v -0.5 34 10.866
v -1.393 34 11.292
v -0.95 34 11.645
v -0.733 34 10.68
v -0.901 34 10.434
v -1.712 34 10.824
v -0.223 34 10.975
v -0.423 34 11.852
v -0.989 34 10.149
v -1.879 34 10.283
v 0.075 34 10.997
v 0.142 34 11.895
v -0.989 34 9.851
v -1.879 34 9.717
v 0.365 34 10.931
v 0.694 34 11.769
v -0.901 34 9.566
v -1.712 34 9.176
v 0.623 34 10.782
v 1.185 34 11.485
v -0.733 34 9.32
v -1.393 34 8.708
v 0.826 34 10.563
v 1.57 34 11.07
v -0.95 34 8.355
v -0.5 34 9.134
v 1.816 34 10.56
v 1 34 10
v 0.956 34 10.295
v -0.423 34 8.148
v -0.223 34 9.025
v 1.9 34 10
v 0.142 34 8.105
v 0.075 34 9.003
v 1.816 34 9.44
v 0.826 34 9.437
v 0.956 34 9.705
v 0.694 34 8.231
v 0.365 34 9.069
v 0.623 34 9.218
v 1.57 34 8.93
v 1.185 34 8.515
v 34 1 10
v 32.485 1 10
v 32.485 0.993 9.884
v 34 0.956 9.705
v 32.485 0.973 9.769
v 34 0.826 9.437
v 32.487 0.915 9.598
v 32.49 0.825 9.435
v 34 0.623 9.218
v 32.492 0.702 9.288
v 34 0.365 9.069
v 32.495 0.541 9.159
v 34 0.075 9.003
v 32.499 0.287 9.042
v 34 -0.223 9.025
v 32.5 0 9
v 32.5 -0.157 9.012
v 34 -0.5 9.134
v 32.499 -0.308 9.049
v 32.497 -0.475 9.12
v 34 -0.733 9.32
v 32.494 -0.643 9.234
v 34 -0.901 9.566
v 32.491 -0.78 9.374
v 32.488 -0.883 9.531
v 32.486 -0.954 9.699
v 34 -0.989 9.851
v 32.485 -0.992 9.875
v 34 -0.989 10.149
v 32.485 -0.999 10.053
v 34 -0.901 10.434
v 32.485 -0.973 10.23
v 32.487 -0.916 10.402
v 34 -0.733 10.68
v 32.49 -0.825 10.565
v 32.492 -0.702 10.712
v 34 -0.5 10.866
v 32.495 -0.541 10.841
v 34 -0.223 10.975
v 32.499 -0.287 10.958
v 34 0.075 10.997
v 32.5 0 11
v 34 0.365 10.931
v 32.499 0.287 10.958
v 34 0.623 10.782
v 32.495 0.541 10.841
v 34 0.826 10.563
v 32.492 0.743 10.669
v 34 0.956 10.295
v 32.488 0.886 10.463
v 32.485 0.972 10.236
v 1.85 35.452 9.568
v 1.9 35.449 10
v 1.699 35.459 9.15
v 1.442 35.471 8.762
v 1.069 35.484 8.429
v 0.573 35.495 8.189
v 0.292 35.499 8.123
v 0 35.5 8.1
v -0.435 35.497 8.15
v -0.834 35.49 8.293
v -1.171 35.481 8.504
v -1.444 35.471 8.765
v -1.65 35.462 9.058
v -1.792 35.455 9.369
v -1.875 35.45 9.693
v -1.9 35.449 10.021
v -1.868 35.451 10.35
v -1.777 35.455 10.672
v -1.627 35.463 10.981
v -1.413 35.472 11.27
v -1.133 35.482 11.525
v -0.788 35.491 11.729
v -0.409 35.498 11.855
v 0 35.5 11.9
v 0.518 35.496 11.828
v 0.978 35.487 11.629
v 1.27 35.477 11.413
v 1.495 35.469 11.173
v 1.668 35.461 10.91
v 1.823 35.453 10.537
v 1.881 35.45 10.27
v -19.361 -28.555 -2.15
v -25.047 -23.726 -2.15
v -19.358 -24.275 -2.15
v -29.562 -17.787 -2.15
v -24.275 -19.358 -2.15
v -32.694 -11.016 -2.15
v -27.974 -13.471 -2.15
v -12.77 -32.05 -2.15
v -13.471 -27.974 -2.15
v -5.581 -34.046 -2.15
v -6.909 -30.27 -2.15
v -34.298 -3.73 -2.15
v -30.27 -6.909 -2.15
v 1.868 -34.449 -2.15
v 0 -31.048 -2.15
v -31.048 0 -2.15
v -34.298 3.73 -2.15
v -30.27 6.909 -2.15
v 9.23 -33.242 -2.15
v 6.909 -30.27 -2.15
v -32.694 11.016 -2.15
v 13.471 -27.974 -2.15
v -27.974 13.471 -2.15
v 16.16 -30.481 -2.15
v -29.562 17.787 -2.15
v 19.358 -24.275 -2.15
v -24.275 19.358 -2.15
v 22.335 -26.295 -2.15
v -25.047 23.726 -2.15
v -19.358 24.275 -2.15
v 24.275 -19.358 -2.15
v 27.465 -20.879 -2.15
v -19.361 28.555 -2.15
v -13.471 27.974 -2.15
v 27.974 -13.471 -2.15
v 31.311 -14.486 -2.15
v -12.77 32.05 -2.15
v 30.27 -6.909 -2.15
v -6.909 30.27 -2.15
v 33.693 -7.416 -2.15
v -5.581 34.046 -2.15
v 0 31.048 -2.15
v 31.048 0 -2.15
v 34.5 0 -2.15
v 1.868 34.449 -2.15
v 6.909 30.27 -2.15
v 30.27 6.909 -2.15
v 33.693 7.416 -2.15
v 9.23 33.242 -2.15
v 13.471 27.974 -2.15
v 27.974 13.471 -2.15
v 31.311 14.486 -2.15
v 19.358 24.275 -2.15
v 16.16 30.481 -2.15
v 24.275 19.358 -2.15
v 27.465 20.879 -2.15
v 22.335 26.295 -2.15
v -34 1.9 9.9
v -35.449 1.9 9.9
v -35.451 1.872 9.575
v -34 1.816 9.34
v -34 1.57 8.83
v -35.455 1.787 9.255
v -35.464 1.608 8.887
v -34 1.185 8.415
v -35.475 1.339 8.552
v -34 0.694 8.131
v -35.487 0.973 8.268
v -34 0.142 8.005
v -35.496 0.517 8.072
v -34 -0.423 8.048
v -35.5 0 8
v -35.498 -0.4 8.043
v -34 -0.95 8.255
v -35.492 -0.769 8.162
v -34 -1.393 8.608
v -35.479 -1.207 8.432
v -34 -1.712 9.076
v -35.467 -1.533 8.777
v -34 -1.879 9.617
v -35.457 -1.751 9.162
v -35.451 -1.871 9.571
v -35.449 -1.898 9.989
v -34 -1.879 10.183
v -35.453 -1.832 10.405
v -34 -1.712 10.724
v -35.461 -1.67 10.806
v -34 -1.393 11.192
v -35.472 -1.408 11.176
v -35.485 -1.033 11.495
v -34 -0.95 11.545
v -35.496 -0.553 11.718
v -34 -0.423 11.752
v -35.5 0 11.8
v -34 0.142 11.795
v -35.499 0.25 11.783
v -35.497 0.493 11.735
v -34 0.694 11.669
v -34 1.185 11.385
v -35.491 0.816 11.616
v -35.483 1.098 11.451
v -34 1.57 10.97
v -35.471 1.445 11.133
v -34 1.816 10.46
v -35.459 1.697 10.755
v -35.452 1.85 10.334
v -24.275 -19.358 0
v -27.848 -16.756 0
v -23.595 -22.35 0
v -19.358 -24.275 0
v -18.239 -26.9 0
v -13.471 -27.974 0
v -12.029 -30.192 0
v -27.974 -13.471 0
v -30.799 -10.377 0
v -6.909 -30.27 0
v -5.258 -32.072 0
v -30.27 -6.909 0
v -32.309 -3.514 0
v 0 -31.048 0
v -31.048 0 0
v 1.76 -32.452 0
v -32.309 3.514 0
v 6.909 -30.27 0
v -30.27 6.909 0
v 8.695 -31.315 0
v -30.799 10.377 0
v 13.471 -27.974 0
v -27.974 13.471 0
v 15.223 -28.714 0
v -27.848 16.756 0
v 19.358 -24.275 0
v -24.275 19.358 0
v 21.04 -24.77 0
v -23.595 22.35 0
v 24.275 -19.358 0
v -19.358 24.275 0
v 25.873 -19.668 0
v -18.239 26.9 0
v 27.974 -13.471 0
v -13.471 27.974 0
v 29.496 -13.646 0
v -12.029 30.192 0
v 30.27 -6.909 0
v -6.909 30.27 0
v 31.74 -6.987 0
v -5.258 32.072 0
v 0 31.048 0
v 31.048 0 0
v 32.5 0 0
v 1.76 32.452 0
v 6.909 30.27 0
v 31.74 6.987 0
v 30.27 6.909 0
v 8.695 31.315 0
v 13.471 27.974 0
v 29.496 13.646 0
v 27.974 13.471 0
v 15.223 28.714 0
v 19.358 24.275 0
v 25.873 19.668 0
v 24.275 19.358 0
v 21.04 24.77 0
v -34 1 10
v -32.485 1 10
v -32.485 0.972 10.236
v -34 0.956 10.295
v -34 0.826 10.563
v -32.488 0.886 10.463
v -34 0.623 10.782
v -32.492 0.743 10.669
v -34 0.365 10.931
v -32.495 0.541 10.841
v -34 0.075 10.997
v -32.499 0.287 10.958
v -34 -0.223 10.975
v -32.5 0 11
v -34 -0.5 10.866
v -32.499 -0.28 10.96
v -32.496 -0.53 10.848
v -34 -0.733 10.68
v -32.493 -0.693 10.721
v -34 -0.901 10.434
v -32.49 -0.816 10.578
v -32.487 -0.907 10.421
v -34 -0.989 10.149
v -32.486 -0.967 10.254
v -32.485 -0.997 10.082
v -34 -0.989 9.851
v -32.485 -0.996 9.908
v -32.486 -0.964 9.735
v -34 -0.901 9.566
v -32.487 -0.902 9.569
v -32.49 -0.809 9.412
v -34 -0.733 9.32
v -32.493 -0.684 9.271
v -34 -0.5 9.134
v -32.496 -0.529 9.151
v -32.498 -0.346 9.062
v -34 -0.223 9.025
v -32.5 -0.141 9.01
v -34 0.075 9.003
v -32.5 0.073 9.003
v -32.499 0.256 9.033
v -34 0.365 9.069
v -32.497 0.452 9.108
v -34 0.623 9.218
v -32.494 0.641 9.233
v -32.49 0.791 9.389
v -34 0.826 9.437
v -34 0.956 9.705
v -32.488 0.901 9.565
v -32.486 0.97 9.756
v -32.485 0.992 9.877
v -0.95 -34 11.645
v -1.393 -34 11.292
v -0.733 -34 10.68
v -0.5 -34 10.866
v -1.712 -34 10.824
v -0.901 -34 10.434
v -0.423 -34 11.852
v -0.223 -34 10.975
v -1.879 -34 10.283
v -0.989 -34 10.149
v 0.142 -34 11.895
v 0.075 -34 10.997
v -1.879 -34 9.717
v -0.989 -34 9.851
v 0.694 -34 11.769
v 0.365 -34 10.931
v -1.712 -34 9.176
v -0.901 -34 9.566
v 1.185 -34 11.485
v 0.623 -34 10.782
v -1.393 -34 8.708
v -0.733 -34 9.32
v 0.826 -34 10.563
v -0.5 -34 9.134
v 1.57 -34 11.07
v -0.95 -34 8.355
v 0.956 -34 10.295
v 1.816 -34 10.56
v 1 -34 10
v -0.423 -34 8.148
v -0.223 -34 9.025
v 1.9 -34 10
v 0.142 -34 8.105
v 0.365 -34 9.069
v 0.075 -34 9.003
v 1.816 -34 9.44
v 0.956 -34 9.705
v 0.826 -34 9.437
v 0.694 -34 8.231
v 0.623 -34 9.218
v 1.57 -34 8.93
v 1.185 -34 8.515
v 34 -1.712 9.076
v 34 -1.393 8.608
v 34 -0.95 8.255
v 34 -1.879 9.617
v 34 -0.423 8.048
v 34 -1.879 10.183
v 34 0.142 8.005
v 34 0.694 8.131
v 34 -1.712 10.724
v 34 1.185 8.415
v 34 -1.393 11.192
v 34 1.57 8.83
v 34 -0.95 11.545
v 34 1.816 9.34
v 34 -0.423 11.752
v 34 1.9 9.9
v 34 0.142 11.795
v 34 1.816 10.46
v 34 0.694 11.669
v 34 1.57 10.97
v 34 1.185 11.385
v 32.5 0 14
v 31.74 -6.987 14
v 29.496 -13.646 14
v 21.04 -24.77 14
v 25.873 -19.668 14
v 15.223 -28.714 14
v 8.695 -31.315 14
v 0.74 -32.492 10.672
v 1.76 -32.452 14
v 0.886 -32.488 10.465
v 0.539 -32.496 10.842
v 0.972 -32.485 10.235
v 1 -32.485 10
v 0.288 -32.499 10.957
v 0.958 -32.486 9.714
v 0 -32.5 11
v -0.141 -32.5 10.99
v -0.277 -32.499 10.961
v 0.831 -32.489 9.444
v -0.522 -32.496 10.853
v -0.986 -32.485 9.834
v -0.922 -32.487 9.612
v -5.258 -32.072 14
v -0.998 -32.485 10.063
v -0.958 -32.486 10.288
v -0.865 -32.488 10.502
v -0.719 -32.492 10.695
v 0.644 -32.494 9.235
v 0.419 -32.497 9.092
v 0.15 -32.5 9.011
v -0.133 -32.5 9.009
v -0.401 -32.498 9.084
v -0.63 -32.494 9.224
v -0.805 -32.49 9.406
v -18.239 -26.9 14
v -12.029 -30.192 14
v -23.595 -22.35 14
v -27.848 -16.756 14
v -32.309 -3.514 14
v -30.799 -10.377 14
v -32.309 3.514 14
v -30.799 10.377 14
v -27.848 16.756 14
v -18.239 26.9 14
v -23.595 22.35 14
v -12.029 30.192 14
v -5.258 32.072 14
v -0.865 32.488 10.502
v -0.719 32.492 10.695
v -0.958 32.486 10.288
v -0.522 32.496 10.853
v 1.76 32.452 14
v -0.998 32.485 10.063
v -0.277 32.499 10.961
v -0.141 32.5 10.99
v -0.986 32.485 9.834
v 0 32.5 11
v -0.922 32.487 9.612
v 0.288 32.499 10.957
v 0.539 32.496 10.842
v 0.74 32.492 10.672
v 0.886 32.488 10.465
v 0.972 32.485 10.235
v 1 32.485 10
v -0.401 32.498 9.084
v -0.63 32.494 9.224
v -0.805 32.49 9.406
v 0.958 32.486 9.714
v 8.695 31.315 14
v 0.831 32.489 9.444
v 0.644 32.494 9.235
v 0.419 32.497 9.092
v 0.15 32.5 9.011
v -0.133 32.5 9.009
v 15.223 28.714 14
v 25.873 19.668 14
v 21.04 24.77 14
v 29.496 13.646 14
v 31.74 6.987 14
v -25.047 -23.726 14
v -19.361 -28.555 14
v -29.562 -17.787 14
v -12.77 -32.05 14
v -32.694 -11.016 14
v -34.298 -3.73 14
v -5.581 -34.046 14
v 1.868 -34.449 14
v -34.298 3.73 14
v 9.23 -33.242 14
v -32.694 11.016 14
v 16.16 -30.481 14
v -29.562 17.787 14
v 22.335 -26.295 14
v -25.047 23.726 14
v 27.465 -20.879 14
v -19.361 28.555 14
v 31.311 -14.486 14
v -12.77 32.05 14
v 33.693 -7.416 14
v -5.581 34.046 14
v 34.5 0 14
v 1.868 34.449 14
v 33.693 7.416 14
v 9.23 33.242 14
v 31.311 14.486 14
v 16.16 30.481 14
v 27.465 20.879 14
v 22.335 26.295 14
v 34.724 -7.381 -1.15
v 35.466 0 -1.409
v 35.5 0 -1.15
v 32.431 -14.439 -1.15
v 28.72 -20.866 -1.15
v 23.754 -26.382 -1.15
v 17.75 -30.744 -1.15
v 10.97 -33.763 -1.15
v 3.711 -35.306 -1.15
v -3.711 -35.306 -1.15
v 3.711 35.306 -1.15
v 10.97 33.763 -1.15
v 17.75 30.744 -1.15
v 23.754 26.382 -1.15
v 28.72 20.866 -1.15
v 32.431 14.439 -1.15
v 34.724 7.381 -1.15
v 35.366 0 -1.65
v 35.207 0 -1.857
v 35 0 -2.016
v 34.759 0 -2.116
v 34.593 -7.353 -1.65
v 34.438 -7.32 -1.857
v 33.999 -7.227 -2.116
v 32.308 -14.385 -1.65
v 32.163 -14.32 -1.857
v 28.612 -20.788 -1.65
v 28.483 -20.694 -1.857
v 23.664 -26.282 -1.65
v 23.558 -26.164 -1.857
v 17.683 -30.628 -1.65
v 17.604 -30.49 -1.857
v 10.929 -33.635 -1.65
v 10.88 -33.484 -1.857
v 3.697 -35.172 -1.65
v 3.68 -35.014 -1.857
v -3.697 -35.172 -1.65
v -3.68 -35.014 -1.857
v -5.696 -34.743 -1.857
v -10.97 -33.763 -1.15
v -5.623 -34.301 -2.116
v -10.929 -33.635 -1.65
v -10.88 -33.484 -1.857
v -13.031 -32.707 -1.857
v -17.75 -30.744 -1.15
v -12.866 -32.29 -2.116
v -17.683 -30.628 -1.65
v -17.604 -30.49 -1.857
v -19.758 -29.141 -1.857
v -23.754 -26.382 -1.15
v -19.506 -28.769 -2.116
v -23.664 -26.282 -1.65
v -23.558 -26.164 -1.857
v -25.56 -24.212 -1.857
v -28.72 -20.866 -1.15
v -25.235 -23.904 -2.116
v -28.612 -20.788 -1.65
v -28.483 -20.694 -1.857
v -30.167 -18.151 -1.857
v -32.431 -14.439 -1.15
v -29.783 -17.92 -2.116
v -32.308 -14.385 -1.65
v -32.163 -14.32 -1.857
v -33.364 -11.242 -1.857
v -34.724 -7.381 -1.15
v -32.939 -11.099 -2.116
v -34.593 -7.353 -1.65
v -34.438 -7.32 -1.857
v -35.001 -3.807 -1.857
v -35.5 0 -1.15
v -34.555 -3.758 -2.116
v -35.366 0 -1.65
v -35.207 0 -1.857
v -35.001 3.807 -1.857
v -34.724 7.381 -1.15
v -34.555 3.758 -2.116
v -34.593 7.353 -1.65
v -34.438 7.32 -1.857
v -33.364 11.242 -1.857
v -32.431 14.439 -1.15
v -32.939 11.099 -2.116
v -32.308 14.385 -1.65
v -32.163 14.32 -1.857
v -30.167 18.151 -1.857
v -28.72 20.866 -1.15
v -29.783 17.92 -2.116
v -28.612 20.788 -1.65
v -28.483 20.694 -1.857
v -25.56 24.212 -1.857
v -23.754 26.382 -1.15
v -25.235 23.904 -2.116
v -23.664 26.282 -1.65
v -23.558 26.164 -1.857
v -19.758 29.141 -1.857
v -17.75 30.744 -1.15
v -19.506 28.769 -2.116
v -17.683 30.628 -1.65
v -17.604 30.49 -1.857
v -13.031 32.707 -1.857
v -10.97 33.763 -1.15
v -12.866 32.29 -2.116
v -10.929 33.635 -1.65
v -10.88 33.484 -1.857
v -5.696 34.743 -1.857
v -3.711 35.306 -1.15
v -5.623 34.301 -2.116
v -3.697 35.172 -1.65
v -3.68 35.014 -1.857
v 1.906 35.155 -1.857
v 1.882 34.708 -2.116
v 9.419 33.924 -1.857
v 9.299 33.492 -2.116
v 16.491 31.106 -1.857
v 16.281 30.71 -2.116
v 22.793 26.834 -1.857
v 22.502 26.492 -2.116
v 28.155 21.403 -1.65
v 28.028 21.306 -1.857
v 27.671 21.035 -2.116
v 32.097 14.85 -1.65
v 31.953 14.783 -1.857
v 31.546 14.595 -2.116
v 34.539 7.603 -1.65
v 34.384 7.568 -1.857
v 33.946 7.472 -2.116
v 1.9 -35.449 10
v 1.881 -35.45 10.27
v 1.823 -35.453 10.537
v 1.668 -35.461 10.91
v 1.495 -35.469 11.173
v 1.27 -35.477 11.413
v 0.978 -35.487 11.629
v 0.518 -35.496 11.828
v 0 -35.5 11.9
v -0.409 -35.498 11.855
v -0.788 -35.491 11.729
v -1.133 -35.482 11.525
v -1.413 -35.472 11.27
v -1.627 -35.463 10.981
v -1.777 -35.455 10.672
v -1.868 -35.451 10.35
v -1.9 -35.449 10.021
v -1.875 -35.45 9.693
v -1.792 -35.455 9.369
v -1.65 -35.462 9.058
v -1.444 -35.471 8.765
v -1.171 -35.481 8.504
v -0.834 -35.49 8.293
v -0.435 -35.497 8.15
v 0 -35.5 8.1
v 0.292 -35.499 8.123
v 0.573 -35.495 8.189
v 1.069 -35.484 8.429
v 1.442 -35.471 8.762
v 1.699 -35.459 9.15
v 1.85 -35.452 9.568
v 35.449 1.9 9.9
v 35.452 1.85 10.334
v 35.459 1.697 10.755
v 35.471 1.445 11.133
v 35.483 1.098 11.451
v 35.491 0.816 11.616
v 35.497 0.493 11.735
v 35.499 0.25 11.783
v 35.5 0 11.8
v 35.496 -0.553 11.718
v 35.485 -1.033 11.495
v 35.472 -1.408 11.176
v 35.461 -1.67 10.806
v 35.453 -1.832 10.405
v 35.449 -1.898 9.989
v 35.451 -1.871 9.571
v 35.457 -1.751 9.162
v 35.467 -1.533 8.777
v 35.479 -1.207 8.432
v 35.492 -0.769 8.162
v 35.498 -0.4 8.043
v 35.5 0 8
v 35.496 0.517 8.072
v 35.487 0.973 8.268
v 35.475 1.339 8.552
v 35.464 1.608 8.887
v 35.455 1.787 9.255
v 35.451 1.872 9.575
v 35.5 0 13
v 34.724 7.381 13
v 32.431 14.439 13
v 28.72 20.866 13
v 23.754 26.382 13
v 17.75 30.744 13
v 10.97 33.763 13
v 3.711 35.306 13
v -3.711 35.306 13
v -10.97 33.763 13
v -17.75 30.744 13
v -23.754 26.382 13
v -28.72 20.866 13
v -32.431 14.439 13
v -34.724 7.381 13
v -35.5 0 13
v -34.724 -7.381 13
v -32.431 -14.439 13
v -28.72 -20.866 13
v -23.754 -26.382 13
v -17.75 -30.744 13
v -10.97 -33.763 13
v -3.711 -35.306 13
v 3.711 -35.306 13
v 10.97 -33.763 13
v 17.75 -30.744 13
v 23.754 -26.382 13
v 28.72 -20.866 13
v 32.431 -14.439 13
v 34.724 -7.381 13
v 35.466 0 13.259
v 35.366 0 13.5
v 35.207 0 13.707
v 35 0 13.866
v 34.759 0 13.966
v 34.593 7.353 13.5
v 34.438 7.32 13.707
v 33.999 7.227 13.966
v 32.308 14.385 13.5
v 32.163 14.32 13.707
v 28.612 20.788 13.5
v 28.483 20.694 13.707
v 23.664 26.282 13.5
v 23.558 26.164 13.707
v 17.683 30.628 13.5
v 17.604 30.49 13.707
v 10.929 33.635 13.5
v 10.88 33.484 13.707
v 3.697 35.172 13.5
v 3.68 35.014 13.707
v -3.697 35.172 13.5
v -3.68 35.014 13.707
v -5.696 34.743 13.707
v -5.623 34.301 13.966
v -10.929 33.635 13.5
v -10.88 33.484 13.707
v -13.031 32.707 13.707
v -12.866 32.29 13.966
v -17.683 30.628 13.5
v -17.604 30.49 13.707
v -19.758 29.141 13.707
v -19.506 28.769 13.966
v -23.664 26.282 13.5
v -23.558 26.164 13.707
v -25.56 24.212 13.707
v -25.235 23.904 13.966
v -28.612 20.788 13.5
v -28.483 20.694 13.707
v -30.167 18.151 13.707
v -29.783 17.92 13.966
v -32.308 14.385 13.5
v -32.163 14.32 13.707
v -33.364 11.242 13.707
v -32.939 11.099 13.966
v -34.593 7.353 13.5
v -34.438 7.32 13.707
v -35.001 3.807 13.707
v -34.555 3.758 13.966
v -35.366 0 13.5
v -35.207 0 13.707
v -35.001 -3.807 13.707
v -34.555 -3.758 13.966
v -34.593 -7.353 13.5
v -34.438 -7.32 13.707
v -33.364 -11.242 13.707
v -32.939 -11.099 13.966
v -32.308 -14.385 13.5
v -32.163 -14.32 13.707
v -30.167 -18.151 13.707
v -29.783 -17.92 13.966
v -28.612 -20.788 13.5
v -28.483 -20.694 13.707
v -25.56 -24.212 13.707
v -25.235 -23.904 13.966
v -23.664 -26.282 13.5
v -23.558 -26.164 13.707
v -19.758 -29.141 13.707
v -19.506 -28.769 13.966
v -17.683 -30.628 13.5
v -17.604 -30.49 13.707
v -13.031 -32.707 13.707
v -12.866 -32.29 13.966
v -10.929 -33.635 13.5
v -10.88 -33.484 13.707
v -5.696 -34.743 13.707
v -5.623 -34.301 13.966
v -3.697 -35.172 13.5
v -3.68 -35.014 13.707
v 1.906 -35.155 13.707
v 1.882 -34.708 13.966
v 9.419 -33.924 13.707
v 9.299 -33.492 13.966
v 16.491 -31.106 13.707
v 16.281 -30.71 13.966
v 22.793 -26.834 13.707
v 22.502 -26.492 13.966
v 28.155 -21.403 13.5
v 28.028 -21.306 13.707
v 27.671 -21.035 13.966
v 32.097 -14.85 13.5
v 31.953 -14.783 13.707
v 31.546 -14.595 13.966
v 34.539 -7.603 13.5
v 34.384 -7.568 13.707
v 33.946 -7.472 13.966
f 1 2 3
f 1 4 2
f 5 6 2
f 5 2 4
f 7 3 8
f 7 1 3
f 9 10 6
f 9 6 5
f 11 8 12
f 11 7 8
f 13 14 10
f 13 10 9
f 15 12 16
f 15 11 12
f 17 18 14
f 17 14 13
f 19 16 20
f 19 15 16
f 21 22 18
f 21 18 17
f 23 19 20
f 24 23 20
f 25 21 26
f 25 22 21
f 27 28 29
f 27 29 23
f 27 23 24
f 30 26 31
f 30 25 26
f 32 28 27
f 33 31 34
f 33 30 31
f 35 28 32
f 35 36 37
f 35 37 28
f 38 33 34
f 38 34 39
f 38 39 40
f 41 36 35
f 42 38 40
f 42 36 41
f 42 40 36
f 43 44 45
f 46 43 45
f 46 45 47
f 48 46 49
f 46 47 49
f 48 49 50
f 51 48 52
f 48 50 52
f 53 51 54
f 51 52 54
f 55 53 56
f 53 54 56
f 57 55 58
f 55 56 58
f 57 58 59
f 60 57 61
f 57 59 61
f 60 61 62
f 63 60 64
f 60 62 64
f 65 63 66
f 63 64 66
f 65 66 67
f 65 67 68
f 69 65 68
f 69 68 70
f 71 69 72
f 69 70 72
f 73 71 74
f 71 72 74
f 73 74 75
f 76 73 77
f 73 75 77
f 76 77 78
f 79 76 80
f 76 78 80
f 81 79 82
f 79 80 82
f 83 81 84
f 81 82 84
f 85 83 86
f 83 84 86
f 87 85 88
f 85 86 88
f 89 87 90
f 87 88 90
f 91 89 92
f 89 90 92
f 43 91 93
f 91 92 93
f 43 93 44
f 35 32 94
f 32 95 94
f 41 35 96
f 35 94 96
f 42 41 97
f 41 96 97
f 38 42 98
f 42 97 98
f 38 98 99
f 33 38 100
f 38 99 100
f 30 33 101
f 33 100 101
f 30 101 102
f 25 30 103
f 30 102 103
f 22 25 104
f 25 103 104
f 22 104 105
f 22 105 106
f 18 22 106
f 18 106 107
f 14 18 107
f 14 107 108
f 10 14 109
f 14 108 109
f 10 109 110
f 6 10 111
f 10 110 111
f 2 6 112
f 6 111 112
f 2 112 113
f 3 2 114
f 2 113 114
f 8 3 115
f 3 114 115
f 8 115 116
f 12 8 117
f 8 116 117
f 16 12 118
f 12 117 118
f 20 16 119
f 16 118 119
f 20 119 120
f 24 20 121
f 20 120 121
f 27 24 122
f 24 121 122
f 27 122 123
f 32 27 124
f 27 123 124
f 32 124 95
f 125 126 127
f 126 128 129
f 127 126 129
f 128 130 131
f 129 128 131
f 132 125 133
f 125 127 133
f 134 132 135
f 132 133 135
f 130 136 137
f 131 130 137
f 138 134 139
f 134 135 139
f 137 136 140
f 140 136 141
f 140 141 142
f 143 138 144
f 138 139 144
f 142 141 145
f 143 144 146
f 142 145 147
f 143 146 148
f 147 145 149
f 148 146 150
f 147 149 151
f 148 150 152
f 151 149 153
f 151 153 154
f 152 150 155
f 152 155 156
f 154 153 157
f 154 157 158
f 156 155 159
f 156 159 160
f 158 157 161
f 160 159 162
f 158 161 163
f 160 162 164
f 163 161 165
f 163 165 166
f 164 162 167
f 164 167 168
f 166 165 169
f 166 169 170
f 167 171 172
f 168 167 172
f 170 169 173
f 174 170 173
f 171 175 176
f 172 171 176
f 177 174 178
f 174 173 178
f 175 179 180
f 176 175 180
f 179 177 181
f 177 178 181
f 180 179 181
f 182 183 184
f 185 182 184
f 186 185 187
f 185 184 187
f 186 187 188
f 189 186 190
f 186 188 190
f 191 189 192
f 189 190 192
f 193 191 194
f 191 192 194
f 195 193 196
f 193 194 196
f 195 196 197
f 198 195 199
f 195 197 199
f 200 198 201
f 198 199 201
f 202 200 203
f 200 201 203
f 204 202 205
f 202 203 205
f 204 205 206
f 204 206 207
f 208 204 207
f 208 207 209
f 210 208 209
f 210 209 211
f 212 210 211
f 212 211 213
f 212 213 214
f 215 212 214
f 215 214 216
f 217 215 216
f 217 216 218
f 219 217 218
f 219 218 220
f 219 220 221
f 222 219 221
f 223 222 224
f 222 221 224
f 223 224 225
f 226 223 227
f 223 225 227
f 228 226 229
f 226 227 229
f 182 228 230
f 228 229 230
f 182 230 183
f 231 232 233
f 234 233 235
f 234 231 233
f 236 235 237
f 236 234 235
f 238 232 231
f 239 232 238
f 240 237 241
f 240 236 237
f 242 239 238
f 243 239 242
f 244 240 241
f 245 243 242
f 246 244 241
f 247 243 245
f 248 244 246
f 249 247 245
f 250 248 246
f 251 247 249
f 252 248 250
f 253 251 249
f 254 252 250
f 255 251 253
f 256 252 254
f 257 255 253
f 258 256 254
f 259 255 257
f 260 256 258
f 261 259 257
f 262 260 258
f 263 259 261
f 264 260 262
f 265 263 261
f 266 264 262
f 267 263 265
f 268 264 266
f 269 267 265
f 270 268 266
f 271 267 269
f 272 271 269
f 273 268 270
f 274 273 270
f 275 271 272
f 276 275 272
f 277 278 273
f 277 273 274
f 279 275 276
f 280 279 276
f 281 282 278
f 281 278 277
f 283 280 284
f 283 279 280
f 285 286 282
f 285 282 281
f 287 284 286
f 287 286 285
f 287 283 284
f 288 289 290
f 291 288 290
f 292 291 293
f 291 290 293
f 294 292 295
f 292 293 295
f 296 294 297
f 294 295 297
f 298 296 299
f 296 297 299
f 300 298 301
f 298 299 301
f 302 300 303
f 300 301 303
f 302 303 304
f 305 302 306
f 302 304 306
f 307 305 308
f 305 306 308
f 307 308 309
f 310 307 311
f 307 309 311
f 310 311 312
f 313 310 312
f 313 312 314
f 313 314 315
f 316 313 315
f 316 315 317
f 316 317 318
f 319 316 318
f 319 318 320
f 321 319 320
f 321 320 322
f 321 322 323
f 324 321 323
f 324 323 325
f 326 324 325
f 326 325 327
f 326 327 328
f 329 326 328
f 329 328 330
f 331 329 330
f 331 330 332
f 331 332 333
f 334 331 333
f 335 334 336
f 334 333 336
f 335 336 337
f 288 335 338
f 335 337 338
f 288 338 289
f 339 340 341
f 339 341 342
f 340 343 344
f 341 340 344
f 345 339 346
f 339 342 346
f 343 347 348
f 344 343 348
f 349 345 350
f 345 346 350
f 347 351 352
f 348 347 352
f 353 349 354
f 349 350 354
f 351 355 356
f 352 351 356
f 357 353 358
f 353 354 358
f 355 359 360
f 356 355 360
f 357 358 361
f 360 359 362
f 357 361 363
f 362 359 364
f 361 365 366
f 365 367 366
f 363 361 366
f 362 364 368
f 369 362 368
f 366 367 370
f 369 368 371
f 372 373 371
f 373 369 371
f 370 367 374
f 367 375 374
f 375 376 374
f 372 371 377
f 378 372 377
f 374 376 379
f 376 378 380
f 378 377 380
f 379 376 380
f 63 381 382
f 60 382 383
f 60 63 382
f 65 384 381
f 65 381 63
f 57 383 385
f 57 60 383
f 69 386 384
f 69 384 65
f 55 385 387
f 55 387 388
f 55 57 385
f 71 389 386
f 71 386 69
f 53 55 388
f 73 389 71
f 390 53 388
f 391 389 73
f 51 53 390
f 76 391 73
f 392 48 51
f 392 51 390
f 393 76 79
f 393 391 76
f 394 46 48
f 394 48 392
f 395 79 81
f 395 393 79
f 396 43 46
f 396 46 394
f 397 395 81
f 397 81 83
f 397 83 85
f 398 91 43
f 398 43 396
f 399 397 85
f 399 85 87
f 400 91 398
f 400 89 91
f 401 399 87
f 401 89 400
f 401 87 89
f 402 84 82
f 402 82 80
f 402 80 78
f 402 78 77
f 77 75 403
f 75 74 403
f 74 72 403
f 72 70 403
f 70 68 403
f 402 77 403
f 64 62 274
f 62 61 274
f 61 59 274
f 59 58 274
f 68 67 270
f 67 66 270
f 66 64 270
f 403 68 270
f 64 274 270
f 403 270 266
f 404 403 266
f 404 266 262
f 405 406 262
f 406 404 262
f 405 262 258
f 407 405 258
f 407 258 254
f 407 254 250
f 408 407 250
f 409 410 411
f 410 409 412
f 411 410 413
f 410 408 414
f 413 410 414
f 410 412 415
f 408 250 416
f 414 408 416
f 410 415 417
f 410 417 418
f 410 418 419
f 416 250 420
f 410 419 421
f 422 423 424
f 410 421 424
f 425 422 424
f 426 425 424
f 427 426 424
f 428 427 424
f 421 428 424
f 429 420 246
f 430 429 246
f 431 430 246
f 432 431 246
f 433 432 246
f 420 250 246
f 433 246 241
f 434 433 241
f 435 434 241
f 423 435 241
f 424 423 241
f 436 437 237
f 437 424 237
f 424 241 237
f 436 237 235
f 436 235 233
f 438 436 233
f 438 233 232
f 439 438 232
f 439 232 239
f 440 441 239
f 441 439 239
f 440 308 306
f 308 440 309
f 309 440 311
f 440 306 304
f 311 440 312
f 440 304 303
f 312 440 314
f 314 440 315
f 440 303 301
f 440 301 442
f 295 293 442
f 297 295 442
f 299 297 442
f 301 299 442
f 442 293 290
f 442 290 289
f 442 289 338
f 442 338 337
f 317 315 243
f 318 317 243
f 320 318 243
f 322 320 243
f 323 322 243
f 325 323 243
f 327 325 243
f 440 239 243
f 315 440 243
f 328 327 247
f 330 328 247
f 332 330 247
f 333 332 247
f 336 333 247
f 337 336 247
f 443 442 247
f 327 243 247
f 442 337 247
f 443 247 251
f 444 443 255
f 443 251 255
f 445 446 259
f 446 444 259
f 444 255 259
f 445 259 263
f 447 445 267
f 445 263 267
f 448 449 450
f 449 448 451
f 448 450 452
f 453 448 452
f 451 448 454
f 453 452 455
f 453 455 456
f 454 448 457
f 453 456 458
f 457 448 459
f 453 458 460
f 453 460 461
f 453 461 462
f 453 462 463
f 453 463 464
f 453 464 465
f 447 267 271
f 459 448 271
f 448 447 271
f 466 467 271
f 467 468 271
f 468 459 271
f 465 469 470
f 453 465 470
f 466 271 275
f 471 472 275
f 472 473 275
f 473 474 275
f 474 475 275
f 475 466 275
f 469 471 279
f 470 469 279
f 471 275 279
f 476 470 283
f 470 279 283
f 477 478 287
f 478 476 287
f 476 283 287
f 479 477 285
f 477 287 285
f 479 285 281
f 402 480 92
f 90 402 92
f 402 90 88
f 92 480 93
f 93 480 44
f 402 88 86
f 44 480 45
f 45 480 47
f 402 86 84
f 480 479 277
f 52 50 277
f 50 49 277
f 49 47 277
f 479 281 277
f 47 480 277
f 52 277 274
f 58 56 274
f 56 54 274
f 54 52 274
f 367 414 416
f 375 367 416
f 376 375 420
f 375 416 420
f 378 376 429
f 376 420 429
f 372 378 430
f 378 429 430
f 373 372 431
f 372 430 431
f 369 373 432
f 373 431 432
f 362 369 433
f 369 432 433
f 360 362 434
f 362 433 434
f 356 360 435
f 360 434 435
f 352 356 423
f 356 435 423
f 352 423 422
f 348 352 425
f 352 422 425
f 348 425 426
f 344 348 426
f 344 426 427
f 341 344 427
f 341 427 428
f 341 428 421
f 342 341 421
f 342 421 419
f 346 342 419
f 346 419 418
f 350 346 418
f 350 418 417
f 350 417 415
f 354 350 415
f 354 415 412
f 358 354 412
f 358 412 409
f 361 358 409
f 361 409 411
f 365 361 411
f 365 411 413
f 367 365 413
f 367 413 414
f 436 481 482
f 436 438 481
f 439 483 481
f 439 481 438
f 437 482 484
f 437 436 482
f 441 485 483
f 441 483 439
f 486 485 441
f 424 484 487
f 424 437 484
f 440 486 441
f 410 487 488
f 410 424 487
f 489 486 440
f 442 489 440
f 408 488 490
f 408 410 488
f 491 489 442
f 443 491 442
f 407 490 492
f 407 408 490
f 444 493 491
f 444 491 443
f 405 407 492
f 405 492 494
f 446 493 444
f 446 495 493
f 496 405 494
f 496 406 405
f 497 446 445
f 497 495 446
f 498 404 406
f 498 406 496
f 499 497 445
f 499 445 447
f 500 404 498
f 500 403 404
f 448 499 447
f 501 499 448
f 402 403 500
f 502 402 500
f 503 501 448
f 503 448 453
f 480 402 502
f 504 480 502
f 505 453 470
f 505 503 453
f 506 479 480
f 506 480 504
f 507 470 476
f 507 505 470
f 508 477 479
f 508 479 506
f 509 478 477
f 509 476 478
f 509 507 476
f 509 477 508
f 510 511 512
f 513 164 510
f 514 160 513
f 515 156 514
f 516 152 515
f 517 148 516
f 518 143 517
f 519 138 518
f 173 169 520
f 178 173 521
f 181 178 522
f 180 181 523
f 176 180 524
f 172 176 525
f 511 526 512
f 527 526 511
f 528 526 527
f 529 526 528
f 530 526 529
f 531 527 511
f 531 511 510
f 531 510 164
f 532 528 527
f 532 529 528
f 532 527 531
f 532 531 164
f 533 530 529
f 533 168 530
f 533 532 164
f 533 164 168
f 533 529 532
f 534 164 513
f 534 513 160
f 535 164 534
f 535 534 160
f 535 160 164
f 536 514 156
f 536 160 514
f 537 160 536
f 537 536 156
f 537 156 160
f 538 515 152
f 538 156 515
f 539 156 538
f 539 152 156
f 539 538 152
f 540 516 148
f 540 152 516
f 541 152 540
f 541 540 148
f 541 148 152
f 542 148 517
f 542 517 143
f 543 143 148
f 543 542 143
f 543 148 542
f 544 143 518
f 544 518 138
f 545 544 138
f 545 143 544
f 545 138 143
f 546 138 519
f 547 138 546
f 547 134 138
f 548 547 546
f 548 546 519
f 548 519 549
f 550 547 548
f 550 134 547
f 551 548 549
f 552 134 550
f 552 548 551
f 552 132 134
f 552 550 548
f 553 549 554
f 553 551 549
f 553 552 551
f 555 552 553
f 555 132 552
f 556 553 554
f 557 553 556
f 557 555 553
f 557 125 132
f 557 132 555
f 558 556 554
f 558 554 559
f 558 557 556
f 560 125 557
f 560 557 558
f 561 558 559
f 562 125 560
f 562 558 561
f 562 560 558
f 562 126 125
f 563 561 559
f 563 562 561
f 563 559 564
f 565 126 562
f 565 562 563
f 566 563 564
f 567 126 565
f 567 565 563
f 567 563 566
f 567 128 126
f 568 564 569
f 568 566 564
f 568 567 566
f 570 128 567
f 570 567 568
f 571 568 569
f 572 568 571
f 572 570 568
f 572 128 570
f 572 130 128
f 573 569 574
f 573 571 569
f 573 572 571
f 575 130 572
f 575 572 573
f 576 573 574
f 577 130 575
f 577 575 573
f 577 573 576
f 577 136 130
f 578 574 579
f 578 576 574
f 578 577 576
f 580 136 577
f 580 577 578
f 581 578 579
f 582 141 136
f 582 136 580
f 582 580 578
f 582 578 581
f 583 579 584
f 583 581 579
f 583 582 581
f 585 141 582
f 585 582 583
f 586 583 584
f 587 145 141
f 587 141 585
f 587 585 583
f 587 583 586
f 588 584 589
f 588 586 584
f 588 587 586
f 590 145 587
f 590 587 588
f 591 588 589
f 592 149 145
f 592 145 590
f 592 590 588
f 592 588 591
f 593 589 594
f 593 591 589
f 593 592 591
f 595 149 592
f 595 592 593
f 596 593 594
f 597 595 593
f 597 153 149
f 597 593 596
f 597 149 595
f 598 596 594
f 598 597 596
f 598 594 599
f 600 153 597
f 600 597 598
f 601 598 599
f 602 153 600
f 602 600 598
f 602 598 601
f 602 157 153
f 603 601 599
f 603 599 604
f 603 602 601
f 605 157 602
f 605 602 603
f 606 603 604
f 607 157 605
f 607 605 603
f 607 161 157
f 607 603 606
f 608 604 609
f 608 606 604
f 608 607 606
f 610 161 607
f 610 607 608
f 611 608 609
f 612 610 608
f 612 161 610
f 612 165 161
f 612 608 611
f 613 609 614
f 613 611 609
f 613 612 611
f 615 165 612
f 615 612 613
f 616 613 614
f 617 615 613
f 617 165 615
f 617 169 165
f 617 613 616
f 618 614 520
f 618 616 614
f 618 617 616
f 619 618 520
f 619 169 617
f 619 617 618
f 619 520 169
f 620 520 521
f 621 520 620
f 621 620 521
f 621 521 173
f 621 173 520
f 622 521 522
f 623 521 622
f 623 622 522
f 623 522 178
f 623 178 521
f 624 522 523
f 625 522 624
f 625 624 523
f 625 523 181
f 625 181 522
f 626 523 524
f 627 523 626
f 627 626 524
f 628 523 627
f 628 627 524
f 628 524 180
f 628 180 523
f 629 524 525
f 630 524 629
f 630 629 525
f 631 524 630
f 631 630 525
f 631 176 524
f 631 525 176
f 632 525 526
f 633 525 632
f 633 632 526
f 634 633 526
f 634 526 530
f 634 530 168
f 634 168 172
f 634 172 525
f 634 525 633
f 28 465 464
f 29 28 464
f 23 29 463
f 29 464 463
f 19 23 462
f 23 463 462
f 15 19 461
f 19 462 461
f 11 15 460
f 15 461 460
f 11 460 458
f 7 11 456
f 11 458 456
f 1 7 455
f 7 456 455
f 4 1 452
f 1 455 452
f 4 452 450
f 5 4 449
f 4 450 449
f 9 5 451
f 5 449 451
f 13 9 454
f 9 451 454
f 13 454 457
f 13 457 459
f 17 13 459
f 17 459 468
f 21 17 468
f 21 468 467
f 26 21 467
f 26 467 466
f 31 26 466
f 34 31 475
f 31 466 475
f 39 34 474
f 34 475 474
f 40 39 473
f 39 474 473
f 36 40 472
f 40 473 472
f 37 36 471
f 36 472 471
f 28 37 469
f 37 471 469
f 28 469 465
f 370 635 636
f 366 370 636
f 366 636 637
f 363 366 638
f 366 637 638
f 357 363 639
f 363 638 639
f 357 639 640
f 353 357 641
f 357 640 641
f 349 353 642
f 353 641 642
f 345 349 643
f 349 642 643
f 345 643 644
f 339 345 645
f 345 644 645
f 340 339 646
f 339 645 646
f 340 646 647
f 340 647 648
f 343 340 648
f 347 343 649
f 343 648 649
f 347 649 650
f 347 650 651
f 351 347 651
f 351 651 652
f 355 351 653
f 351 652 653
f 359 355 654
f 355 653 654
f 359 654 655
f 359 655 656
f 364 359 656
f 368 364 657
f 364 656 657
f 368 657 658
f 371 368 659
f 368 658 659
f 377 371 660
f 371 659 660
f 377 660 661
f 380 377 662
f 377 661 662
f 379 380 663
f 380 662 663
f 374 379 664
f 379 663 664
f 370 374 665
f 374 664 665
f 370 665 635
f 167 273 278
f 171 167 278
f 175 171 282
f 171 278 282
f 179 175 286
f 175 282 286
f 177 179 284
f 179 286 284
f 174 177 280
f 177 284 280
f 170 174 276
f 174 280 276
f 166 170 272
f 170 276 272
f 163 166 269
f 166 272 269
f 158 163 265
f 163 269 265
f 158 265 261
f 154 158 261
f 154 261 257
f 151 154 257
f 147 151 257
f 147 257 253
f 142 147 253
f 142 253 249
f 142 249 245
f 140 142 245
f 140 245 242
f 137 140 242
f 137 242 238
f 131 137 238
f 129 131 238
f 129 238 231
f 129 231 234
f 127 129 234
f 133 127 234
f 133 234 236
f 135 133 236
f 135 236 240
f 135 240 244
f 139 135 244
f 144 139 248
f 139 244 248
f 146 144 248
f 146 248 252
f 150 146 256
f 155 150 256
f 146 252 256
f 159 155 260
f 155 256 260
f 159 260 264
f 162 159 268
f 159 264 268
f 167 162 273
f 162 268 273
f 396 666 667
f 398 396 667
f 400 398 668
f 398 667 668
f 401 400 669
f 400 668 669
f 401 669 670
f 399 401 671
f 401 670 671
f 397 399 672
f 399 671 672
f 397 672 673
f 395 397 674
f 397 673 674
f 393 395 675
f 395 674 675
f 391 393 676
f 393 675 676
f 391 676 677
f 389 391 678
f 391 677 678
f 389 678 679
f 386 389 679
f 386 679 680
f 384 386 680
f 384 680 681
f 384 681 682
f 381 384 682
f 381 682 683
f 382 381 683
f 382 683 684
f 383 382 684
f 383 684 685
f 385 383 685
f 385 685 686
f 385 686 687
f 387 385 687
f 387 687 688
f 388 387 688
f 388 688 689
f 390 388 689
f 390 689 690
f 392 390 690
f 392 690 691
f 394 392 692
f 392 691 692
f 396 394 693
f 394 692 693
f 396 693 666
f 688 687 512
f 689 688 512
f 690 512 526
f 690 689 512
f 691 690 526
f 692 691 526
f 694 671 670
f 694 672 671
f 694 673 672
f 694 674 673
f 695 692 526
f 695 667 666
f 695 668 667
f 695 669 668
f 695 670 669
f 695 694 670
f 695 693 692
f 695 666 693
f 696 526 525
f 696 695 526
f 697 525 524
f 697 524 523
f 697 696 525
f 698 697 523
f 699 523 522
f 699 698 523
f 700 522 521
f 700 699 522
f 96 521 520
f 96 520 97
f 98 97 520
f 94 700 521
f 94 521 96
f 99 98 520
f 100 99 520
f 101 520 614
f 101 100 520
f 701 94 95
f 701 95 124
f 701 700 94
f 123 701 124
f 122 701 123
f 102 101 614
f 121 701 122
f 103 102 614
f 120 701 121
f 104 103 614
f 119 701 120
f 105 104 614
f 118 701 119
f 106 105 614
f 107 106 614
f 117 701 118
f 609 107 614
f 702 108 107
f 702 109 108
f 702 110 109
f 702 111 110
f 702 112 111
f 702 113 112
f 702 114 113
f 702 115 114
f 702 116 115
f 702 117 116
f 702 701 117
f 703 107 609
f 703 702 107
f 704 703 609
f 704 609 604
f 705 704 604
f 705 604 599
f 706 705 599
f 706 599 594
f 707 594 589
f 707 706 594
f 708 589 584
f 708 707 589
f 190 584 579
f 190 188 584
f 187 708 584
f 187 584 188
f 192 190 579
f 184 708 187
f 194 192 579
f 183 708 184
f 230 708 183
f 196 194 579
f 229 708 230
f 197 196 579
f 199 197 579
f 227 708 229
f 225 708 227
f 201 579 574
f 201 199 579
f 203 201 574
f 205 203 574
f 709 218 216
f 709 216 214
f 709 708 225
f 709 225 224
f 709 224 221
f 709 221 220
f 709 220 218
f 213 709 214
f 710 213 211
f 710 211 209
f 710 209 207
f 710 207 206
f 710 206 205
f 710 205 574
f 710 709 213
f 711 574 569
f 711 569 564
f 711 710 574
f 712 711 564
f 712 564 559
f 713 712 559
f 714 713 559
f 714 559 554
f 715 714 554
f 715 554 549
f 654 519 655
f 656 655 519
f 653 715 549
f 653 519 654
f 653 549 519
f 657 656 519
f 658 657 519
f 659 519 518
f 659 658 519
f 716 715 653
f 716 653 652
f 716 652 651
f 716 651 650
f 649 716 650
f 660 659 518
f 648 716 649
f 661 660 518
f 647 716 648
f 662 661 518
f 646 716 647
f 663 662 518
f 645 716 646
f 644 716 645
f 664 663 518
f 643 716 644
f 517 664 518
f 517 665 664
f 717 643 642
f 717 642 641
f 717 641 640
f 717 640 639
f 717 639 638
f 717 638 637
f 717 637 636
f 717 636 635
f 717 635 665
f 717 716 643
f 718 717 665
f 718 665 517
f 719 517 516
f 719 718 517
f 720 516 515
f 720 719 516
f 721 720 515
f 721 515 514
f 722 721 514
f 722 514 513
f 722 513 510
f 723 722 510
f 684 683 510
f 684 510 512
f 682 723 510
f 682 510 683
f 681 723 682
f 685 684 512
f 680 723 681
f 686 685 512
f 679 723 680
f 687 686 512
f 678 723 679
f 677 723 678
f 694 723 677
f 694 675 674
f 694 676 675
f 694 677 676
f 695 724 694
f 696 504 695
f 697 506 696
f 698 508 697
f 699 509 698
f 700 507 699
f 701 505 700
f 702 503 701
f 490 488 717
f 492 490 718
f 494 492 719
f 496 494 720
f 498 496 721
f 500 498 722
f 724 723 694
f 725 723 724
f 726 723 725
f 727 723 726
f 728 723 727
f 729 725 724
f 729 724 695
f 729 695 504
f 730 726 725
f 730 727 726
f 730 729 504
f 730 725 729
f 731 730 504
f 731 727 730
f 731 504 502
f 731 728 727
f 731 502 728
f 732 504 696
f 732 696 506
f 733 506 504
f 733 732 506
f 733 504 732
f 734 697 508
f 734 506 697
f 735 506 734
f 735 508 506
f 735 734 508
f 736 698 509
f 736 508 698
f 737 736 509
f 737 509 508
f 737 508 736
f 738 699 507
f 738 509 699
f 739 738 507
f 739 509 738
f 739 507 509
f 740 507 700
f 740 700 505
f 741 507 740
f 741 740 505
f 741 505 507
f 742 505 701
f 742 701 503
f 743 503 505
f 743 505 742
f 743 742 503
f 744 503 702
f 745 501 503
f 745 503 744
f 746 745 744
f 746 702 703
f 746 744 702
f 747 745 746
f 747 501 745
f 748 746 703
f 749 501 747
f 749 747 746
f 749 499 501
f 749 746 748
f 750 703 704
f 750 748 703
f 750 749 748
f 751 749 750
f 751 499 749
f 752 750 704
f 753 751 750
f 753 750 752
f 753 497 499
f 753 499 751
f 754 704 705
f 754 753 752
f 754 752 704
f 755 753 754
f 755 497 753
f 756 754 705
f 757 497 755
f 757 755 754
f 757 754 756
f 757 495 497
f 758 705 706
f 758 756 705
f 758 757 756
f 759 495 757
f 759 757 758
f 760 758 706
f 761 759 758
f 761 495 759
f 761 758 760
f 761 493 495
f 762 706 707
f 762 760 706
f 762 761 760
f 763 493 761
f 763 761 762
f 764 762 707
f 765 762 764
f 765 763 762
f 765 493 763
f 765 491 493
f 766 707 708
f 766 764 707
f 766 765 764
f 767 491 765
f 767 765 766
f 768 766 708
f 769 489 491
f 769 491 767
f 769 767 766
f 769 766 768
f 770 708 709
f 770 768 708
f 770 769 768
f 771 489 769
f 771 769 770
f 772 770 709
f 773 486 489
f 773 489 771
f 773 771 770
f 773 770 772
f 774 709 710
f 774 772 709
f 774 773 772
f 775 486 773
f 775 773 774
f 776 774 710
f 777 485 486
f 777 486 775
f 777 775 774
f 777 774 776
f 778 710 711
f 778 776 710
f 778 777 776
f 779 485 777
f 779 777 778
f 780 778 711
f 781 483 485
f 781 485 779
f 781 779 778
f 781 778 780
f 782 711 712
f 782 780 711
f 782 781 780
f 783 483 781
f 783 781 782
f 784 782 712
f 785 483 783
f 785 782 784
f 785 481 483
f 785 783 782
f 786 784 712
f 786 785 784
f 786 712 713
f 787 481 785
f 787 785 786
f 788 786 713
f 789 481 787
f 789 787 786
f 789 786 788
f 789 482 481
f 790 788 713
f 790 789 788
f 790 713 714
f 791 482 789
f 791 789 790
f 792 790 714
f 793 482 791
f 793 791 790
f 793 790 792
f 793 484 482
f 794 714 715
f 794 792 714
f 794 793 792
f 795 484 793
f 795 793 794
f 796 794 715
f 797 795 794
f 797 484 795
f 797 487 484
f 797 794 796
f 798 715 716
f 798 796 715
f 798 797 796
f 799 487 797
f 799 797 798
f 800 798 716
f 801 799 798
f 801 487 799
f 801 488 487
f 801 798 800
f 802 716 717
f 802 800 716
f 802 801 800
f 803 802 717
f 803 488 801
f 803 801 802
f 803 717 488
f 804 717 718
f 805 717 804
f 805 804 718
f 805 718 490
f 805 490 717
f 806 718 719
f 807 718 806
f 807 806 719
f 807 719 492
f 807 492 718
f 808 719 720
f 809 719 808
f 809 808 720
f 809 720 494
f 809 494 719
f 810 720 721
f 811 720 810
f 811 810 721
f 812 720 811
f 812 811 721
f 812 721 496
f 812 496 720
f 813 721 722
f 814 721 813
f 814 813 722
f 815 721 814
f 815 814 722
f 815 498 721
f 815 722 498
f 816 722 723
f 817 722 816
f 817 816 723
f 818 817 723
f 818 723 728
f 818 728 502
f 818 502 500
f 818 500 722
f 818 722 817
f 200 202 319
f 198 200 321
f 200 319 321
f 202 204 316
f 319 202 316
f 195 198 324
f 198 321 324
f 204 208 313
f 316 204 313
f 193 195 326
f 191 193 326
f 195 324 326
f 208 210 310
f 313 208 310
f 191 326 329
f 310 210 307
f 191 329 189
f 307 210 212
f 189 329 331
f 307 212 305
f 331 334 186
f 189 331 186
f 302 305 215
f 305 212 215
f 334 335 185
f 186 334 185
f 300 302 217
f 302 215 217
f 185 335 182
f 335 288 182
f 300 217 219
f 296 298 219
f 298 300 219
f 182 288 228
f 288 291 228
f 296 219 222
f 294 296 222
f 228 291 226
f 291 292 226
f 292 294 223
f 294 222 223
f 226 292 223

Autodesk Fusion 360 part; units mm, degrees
sketch "Sketch1" plane through (0, 0, 0) normal (0, 0, 1) x (1, 0, 0)
  circle A0 centre (0, 0) radius 35.5
  circle A1 centre (0, 0) radius 32.5
  dimension "d2" = 71
  dimension "d3" = 65
extrude "Extrude1" add sketch "Sketch1" along normal blind 14
sketch "Sketch2" plane through (0, 0, 0) normal (0, 0, 1) x (1, 0, 0)
  circle A0 centre (0, 0) radius 31
  dimension "d8" = 62
sketch "Sketch3" plane through (0, 0, 0) normal (0, 0, 1) x (1, 0, 0)
  circle A0 centre (0, 0) radius 32.5
  circle A1 centre (0, 0) radius 31.0483
extrude "Extrude3" add sketch "Sketch3" sketch "Sketch1" against normal blind 2.15 of sketch 2
fillet "Fillet1" radius 1 1 edges at (-33.0976, 12.8373, -2.15)
sketch "Sketch4" plane through (0, 0, 0) normal (0, 1, 0) x (1, 0, 0)
  line L0 (-35.5, -14) -> (35.5, -14)
  line L1 (0, -14) -> (0, -11)
  circle A0 centre (0, -10) radius 1
  dimension "d13" = 3
  dimension "d14" = 2
extrude "Extrude4" cut sketch "Sketch4" along normal through all and the other way through all
sketch "Sketch5" plane through (0, 0, 0) normal (1, 0, 0) x (0, 1, 0)
  line L0 (0, 14) -> (0, 11)
  circle A0 centre (0, 10) radius 1
  point P0 (0, 14)
  dimension "d16" = 3
  dimension "d17" = 2
extrude "Extrude5" cut sketch "Sketch5" along normal through all and the other way through all
ref_plane "WorkPlane1" through (0, 35.5, 0) normal (0, 1, 0) x (0, 0, 1)
sketch "Sketch6" plane through (0, 35.5, 0) normal (0, 1, 0) x (1, 0, 0)
  circle A0 centre (0, -10) radius 1.9
  dimension "d24" = 3.8
extrude "Extrude6" cut sketch "Sketch6" against normal blind 1.5
ref_plane "WorkPlane2" through (0, -35.5, 0) normal (0, 1, 0) x (0, 0, 1)
sketch "Sketch7" plane through (0, -35.5, 0) normal (0, 1, 0) x (1, 0, 0)
  circle A0 centre (0, -10) radius 1.9
  circle A1 centre (0, -10) radius 1
  dimension "d28" = 3.8
extrude "Extrude7" cut sketch "Sketch7" along normal blind 1.5
ref_plane "WorkPlane3" through (-35.5, 0, 0) normal (1, 0, 0) x (0, 1, 0)
sketch "Sketch8" plane through (-35.5, 0, 0) normal (1, 0, 0) x (0, 1, 0)
  circle A0 centre (0, 9.9) radius 1.9
  dimension "d32" = 3.8
extrude "Extrude8" cut sketch "Sketch8" along normal blind 1.5
ref_plane "WorkPlane4" through (35.5, 0, 0) normal (1, 0, 0) x (0, 1, 0)
sketch "Sketch9" plane through (35.5, 0, 0) normal (1, 0, 0) x (0, 1, 0)
  circle A0 centre (0, 9.9) radius 1.9
  circle A1 centre (0, 9.9) radius 1.9
  dimension "d36" = 3.8
extrude "Extrude9" cut sketch "Sketch9" against normal blind 1.5
fillet "Fillet3" radius 1 1 edges at (-33.0976, -12.8373, 14)
